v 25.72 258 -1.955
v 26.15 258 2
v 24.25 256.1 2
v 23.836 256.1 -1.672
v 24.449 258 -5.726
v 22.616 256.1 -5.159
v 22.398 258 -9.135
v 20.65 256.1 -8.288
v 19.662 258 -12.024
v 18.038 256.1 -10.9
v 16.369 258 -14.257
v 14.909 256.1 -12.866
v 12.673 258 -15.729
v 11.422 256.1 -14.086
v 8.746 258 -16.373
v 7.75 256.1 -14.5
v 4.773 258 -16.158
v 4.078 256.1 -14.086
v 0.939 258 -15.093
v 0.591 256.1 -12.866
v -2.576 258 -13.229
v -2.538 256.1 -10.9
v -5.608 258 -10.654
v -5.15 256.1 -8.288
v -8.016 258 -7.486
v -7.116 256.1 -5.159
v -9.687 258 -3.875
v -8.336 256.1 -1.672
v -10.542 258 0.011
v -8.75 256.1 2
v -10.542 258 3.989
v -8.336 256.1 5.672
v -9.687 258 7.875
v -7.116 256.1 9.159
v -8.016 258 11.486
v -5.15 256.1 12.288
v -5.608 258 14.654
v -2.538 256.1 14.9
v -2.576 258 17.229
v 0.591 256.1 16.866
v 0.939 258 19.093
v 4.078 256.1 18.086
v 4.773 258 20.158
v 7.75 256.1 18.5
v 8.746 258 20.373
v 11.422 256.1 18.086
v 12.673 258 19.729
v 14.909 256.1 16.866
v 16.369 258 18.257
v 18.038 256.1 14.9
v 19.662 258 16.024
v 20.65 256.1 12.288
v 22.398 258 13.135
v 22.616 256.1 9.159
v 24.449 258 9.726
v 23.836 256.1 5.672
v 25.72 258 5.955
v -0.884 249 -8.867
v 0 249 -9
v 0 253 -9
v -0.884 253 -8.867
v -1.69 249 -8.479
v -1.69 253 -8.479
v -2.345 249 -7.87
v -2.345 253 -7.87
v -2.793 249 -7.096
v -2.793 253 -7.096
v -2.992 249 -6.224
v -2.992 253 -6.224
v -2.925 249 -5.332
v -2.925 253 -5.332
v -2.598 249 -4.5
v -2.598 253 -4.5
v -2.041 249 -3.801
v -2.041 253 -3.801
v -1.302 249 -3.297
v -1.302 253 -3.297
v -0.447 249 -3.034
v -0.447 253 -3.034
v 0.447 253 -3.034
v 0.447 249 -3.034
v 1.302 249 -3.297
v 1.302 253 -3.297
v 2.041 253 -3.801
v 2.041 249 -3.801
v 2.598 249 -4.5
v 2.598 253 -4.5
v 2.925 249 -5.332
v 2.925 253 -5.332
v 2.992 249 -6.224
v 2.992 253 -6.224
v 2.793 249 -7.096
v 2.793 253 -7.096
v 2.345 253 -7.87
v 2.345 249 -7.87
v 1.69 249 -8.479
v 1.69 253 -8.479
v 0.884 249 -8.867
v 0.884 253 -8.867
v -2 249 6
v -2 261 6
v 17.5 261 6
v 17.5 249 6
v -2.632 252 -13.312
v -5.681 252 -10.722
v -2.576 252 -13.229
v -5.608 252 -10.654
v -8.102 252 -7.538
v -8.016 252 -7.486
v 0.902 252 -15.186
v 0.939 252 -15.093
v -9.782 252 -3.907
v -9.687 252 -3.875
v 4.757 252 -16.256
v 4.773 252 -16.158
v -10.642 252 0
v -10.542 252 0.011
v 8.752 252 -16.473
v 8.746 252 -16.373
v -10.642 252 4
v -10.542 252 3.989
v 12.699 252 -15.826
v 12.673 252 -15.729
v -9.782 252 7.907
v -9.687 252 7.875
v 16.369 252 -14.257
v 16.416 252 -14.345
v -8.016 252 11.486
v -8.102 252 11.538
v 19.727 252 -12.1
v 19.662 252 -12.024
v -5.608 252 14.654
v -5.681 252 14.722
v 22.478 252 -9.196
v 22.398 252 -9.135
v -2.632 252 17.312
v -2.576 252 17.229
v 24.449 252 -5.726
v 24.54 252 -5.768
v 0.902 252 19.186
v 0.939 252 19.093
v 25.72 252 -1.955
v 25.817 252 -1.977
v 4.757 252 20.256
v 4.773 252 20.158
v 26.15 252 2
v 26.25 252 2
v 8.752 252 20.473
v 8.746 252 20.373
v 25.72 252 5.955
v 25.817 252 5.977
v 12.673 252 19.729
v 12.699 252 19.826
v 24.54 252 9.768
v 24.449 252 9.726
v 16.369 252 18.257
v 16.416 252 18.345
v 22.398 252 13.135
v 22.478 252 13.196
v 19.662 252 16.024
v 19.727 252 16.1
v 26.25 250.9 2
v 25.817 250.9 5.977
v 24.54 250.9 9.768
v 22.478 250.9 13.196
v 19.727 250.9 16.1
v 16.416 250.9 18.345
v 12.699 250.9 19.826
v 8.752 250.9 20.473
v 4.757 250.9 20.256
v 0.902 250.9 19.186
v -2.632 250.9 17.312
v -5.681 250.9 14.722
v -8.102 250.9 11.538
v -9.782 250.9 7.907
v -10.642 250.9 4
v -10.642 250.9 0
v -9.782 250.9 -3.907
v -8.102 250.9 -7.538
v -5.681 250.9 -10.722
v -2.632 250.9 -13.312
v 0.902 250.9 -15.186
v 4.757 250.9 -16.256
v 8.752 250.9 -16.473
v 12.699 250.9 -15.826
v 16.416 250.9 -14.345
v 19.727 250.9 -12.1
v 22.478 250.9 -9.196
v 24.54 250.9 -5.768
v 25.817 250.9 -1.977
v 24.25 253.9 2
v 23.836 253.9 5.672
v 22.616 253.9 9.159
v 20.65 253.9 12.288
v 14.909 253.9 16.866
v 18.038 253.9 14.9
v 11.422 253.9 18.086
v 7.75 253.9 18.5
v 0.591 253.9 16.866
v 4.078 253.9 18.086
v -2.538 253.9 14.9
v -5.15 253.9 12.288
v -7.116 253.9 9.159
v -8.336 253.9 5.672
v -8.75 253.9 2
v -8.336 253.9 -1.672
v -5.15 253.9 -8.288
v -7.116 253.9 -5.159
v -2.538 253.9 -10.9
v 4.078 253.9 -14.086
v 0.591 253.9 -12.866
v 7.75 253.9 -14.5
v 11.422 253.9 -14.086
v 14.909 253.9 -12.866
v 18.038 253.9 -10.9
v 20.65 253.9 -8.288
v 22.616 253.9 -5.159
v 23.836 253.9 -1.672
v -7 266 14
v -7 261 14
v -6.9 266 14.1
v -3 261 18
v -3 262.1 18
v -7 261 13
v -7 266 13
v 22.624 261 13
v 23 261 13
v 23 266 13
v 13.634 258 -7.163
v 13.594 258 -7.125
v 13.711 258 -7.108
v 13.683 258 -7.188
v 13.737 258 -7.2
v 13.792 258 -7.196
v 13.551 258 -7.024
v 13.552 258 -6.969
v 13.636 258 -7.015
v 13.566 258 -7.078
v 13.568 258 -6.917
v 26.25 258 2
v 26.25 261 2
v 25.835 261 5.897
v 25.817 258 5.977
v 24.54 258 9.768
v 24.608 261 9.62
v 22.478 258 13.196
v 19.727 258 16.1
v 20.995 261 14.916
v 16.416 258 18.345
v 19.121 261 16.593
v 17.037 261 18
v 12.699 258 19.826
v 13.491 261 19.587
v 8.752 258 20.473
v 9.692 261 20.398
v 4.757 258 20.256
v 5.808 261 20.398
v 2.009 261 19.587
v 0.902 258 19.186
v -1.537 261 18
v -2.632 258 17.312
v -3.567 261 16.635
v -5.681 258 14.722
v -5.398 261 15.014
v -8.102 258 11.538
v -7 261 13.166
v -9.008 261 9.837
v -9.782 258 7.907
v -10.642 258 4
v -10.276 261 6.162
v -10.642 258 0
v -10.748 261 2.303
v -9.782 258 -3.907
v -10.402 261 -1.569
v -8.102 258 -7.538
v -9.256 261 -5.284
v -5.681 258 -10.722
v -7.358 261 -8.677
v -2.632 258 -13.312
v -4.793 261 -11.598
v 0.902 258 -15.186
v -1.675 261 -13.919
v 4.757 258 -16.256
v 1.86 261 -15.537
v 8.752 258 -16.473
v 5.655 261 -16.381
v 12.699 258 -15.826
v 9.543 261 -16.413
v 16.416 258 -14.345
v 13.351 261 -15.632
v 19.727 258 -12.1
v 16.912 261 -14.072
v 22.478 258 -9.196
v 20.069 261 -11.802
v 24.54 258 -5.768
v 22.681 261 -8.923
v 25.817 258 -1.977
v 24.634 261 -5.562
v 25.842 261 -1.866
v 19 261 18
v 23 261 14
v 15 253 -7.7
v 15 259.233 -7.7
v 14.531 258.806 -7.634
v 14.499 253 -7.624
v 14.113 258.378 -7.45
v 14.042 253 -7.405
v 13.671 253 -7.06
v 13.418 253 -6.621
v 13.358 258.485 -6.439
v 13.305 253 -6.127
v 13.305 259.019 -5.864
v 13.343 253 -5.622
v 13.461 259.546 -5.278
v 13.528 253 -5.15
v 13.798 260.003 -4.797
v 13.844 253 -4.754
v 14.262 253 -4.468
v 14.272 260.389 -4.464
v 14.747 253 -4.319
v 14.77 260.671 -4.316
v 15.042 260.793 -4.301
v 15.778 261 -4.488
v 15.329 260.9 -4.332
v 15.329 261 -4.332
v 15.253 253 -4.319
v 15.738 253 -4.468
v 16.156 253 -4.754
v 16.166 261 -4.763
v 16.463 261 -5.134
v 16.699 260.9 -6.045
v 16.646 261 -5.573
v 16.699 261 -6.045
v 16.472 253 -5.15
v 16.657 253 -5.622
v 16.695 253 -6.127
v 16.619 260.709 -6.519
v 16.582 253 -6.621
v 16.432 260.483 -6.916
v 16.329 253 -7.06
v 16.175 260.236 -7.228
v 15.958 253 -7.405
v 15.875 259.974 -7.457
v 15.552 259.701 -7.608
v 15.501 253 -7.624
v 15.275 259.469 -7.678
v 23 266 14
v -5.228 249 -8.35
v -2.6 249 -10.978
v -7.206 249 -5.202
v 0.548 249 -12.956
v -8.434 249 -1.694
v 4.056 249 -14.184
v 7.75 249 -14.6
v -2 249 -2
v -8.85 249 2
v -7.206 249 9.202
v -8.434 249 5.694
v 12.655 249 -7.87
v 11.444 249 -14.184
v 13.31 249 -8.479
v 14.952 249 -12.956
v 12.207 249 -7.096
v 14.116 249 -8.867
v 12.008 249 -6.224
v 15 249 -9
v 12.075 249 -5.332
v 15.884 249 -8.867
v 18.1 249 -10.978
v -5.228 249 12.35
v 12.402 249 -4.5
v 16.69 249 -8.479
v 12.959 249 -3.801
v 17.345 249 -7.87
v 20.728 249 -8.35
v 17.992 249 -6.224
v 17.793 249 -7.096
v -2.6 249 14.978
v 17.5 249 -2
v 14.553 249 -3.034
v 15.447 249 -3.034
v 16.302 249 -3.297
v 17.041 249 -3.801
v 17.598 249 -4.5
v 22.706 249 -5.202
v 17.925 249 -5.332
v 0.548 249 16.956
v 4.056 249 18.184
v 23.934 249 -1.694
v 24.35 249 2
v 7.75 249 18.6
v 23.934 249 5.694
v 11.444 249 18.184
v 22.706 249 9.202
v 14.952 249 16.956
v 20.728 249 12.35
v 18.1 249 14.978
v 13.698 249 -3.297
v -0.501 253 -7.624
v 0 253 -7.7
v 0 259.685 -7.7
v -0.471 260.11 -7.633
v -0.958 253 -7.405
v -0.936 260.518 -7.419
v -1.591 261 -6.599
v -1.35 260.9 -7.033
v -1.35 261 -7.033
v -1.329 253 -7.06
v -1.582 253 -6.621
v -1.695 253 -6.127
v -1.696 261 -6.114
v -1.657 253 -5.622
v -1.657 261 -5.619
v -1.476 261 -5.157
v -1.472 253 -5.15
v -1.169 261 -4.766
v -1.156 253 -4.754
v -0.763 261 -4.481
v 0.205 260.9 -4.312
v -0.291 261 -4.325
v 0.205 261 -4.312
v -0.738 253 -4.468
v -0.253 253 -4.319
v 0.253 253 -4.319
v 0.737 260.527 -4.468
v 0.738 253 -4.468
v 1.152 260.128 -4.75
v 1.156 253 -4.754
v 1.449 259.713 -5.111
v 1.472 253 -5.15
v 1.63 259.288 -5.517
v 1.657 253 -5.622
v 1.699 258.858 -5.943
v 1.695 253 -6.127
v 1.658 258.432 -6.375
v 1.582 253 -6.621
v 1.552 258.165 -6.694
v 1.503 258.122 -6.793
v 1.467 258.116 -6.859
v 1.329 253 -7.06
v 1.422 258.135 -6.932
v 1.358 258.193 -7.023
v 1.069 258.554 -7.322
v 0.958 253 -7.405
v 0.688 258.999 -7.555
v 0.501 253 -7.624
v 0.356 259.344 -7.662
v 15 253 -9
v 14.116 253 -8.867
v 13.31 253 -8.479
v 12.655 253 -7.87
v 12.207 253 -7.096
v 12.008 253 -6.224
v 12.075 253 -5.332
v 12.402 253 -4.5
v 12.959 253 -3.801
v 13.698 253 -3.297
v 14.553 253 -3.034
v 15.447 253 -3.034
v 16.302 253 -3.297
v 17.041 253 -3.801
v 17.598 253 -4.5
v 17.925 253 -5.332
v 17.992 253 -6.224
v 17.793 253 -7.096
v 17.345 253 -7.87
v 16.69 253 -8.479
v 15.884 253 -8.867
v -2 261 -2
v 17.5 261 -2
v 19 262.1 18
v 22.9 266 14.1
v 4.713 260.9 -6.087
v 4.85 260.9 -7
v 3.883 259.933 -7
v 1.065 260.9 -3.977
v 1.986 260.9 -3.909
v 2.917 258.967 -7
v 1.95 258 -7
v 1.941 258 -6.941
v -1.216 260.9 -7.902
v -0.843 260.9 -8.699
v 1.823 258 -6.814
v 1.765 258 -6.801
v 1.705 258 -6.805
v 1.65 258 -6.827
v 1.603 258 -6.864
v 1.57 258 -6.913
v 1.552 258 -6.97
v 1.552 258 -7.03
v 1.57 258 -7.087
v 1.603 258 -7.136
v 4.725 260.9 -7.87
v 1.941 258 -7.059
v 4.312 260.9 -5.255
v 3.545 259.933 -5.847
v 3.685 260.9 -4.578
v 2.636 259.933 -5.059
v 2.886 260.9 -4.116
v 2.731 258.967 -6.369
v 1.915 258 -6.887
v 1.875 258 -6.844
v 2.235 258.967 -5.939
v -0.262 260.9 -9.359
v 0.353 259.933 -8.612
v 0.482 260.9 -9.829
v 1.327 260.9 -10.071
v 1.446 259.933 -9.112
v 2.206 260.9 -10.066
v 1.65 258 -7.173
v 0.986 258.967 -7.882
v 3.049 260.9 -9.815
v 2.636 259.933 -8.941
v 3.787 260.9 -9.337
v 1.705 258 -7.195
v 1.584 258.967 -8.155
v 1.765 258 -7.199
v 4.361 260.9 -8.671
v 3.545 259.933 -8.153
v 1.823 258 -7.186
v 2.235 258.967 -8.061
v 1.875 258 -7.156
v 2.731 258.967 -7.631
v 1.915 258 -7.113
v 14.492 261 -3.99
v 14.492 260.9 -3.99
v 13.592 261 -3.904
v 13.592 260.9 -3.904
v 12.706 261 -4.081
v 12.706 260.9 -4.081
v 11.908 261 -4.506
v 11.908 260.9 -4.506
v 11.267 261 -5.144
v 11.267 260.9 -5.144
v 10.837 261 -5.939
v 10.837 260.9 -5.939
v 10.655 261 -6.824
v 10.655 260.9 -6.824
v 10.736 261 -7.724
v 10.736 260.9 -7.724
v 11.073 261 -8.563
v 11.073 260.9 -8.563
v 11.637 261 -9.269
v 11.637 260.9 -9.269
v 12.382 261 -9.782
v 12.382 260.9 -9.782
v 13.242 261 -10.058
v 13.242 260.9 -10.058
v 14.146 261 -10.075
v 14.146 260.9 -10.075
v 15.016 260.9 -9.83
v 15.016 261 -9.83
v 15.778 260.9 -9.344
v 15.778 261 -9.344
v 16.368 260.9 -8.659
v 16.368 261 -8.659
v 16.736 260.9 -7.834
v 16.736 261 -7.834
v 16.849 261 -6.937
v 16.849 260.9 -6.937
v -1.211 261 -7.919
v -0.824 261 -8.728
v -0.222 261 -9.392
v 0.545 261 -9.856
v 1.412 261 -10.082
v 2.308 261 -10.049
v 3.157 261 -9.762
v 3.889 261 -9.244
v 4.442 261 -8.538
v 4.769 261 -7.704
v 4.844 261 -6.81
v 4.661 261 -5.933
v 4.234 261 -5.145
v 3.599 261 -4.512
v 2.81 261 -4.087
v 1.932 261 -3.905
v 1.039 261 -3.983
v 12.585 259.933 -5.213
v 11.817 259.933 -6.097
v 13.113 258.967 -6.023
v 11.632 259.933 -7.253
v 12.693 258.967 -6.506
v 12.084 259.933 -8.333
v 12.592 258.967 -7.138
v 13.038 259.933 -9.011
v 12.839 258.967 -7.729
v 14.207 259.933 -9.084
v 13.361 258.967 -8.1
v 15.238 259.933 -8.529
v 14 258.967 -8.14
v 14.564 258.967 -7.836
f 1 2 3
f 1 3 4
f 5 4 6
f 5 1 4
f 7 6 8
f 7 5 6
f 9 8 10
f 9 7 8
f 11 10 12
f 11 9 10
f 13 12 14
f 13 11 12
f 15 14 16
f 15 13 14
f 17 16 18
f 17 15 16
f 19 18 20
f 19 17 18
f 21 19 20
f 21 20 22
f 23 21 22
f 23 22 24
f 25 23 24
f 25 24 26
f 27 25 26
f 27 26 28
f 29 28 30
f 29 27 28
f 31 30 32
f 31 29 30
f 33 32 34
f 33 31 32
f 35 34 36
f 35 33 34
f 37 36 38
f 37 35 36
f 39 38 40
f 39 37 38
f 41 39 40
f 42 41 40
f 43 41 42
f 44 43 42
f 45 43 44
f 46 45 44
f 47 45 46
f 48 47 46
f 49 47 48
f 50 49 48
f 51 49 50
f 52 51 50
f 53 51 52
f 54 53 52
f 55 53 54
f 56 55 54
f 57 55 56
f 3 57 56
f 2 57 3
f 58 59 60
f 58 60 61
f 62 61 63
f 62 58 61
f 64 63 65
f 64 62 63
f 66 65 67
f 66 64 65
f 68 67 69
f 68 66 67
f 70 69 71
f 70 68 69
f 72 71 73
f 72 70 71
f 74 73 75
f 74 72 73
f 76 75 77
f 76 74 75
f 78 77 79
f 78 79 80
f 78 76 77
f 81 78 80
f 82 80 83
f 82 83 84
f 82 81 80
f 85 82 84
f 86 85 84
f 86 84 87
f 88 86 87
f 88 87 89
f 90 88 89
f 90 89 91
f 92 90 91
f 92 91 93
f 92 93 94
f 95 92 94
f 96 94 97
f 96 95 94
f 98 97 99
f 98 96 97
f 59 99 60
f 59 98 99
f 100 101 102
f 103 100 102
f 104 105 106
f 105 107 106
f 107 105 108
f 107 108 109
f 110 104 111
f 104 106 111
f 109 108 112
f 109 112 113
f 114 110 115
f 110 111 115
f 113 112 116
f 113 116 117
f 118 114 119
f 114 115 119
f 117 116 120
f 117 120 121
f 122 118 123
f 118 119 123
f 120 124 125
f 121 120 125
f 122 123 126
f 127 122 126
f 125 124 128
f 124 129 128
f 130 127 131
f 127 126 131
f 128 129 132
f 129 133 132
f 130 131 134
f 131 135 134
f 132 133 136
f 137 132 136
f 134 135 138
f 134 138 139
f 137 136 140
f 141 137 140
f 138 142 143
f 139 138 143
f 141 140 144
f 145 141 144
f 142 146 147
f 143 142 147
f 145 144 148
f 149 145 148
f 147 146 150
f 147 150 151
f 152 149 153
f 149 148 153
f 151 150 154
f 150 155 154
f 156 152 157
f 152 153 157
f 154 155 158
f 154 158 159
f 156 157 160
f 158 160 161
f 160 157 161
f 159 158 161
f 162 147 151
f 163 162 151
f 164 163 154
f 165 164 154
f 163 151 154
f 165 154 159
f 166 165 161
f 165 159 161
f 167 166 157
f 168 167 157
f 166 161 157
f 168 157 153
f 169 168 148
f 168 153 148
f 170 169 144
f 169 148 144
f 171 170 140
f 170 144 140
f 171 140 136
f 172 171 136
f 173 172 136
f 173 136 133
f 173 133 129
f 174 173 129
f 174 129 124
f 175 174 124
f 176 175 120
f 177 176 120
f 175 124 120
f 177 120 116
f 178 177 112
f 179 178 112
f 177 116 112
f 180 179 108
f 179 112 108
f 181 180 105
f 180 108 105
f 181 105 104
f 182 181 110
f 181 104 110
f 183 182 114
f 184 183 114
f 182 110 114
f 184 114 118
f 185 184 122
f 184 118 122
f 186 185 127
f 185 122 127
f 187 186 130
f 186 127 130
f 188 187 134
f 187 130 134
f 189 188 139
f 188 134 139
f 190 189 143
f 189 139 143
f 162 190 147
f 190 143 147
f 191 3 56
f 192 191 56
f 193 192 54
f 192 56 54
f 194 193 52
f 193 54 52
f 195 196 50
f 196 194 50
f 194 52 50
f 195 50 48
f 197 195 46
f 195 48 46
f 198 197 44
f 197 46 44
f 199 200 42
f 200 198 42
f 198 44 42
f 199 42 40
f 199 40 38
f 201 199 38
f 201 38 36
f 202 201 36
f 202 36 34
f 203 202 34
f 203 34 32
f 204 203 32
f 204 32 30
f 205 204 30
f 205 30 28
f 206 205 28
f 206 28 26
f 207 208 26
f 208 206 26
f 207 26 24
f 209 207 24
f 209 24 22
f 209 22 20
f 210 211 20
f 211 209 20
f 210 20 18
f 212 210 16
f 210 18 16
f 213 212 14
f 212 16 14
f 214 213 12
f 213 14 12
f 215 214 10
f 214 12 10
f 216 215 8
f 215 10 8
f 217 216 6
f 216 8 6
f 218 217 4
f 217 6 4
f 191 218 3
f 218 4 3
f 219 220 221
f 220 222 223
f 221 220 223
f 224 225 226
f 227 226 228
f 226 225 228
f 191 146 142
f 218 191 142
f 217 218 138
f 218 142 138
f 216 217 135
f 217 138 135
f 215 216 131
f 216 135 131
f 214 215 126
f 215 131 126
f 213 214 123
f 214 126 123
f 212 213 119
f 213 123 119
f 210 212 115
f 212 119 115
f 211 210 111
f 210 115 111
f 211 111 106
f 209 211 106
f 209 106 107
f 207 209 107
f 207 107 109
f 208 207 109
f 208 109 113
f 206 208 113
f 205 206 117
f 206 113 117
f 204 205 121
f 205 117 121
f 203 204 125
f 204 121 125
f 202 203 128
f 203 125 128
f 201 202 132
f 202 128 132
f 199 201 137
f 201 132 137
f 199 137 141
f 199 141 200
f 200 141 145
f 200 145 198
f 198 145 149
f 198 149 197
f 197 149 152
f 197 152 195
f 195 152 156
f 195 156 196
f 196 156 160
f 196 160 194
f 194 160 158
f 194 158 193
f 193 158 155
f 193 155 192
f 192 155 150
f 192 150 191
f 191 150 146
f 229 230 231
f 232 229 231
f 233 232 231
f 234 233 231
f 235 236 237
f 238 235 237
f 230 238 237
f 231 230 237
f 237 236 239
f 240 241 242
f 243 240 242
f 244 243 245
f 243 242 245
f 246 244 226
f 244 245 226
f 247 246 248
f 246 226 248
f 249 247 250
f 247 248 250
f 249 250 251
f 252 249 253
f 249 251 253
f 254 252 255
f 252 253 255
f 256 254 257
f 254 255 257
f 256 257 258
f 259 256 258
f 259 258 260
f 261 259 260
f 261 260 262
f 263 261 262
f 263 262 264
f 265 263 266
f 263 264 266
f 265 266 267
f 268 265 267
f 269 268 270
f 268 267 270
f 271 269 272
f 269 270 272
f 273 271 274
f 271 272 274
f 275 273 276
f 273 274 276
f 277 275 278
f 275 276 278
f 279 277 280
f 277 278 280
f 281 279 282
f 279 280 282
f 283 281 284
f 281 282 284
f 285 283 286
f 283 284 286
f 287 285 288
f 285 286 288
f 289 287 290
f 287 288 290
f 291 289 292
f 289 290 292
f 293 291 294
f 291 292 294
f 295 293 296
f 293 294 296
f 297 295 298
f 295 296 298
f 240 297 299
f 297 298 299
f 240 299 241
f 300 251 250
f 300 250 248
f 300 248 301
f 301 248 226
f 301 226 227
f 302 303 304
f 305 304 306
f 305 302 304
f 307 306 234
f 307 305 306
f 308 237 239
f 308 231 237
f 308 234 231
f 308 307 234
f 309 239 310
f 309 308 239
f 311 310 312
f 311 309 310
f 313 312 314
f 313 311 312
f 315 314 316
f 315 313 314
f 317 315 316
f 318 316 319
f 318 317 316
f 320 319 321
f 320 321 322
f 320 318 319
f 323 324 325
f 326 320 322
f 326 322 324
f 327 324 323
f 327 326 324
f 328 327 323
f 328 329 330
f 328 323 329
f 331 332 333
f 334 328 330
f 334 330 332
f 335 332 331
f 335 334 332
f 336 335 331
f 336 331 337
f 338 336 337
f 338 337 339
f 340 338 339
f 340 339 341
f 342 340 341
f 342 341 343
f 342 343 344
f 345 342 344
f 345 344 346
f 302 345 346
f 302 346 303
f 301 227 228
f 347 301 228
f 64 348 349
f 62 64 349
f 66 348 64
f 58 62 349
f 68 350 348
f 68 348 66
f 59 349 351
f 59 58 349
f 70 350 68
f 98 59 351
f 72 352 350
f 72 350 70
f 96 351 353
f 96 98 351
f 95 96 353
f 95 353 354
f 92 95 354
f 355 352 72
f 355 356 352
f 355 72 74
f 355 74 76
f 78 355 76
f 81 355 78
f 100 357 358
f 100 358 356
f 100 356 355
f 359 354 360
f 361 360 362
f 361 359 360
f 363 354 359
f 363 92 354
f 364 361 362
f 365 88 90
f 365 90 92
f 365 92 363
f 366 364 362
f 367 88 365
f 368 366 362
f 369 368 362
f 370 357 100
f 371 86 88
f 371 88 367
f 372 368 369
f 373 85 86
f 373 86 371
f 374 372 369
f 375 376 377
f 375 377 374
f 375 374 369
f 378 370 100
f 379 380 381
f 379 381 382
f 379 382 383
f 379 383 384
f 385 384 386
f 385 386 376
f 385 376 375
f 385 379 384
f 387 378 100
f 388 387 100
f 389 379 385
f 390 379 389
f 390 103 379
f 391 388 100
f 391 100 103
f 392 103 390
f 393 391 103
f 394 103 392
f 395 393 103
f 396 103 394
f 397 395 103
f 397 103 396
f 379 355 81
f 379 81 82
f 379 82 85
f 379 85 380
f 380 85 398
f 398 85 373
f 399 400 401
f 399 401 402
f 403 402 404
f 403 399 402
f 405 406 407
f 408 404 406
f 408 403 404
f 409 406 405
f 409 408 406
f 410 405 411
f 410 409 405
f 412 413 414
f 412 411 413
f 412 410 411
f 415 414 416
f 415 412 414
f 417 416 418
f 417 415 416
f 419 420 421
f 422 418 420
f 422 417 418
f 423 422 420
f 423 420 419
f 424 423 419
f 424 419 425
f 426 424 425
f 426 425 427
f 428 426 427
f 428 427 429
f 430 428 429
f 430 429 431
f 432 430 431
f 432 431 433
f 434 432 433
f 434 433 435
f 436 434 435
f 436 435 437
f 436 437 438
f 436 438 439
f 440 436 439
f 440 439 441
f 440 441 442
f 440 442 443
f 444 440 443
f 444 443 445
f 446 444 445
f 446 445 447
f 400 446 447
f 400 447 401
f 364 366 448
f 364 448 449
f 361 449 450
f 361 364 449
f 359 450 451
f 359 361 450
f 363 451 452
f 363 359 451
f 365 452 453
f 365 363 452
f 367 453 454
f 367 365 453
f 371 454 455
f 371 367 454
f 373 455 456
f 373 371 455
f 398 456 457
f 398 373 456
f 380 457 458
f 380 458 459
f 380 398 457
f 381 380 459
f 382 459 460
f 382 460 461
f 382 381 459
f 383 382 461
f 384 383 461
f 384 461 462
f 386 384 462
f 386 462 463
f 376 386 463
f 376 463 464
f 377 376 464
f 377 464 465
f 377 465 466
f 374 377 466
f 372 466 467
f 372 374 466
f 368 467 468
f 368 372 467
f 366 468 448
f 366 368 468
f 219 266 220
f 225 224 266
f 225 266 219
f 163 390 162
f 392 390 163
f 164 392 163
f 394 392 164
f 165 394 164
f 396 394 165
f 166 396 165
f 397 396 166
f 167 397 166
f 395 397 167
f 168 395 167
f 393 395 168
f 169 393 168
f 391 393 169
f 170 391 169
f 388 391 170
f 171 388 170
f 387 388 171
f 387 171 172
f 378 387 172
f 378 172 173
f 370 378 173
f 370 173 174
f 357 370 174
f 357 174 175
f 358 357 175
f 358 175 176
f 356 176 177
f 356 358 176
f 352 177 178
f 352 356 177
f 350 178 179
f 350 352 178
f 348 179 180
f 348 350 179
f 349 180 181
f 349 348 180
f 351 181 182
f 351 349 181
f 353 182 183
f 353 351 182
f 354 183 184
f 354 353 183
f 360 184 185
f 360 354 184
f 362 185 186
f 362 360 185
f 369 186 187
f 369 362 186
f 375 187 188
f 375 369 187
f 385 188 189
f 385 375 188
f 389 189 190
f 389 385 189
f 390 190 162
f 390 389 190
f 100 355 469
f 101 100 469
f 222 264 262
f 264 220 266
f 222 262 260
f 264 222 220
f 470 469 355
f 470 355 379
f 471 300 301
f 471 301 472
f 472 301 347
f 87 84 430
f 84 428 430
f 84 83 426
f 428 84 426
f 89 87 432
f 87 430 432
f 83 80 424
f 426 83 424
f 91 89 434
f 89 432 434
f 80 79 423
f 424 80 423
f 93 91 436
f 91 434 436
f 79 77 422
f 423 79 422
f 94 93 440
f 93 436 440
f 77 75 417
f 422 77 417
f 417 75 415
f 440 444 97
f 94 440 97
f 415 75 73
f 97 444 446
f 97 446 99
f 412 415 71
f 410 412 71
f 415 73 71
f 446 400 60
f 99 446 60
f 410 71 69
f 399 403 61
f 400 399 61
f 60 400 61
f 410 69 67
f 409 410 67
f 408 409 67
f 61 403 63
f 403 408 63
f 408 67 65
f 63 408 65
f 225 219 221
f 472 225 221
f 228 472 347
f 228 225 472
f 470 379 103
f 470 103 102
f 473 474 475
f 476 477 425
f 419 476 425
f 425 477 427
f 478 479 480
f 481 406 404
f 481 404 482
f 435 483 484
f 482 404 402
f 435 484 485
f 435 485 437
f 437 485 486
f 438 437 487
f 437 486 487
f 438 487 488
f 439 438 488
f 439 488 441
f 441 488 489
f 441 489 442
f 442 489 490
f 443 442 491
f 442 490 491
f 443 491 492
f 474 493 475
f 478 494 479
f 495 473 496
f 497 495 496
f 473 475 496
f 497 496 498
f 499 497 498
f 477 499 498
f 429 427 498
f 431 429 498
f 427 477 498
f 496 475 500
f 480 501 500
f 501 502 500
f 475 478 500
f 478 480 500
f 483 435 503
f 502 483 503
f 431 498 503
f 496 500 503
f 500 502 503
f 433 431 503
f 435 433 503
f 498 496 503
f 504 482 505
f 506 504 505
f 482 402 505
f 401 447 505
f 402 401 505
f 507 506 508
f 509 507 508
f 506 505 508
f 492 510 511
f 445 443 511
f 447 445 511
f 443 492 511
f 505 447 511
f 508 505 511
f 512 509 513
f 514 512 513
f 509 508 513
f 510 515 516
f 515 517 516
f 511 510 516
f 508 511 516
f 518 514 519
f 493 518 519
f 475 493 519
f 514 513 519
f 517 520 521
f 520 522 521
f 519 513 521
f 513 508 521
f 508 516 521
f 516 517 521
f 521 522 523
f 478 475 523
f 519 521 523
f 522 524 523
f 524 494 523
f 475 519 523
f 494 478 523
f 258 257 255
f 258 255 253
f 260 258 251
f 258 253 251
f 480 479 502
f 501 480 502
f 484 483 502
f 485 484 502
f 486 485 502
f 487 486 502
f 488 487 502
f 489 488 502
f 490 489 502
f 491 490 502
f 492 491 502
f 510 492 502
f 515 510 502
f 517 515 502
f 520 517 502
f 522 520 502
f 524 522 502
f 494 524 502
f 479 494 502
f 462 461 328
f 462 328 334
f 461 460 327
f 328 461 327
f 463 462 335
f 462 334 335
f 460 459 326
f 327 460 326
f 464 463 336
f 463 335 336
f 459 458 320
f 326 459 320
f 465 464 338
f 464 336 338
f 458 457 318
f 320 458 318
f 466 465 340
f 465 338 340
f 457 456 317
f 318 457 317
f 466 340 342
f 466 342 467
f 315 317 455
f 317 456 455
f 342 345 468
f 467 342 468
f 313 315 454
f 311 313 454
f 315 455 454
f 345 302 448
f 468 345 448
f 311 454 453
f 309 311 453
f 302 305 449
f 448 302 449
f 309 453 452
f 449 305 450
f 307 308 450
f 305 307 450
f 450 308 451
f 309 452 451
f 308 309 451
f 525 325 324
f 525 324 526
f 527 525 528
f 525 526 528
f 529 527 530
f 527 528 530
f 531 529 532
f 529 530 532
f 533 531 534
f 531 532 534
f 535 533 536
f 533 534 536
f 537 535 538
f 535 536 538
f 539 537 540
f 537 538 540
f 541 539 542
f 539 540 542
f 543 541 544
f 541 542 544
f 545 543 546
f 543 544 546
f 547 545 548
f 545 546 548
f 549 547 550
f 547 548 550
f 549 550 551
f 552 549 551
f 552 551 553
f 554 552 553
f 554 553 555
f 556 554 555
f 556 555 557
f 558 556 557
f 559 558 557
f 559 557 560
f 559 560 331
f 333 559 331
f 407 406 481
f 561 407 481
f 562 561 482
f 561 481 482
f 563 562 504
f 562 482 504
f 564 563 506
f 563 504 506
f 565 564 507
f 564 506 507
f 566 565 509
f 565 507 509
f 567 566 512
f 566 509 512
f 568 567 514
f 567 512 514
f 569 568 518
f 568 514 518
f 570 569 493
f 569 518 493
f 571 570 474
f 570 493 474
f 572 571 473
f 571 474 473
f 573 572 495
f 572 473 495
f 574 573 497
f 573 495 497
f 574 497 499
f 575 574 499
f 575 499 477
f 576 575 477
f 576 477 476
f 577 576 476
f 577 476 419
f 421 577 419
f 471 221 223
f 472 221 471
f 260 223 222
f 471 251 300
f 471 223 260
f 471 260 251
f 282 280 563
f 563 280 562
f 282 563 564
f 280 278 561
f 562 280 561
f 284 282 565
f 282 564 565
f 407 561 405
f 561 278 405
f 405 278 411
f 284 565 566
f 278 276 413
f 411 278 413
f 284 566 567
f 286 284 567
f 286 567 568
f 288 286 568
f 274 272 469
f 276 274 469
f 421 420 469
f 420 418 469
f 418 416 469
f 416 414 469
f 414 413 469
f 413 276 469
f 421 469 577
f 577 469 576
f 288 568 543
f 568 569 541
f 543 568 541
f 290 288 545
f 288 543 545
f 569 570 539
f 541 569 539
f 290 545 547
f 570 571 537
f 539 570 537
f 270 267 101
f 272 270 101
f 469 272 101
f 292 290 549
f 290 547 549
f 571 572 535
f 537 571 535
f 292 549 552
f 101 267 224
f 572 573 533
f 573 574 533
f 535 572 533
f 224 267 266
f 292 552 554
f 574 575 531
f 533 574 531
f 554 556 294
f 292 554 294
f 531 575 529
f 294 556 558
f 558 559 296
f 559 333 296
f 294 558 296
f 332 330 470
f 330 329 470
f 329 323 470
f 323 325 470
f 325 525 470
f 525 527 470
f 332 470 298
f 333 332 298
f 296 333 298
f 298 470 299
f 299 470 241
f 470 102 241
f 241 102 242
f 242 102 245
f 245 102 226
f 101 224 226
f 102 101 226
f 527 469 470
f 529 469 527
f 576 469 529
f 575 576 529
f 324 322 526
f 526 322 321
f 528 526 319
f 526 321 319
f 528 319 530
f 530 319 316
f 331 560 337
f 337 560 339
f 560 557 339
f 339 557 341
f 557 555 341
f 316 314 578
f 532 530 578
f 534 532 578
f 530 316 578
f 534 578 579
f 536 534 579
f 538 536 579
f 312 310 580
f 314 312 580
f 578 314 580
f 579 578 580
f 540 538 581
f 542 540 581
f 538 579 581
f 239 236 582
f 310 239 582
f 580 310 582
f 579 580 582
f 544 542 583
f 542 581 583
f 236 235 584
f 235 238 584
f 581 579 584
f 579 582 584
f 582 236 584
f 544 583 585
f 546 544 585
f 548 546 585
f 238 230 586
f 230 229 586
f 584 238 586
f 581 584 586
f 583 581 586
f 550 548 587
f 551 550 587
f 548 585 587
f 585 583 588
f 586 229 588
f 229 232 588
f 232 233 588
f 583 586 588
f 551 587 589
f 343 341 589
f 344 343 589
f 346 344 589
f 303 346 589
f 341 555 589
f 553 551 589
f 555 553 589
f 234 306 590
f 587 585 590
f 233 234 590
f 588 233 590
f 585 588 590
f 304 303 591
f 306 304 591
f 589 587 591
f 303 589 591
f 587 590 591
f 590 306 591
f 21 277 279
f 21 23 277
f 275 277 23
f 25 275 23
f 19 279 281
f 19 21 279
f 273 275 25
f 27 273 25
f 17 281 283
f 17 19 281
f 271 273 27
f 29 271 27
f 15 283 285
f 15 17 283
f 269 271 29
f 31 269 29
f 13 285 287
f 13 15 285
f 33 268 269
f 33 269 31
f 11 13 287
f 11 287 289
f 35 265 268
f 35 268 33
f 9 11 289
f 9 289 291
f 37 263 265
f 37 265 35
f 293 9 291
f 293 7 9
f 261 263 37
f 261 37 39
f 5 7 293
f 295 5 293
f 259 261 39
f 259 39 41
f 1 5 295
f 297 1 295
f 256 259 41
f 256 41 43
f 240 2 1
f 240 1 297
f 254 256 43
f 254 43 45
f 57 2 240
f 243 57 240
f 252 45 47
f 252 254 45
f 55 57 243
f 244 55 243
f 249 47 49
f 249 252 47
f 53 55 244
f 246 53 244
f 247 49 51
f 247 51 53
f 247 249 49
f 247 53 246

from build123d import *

# Parameters (mm, degrees)
CYLINDER027_R             = 3
CYLINDER027_DEPTH         = 4
BOX005009016_W            = 16
BOX005009016_H            = 5.6
BOX005009016_DEPTH        = 3
CYLINDER026_R             = 1.7
CYLINDER026_DEPTH         = 30
FUSION026_PITCH_ANGLE     = 90
FUSION026_PLACEMENT_ANGLE = 90
FUSION025_PITCH_ANGLE     = 90
FUSION025_PLACEMENT_ANGLE = 90
BOX005009013_W            = 19.5
BOX005009013_H            = 400
BOX005009013_DEPTH        = 8
CYLINDER023_R             = 3.1
CYLINDER023_DEPTH         = 6
CYLINDER023_ROLL_ANGLE    = 90
CHAMFER015_SIZE           = 2.9
CHAMFER013_SIZE           = 2.9
CYLINDER021_R             = 18.5
CYLINDER021_DEPTH         = 3
CYLINDER021_ROLL_ANGLE    = 90
CYLINDER020_R             = 16.5
CYLINDER020_DEPTH         = 10
CYLINDER020_ROLL_ANGLE    = 90
CYLINDER019_R             = 18.5
CYLINDER019_DEPTH         = 3
CYLINDER019_ROLL_ANGLE    = 90
BOX005009014_W            = 30
BOX005009014_H            = 5
BOX005009014_DEPTH        = 5
CHAMFER016_SIZE           = 4
CHAMFER017_SIZE           = 4
CHAMFER018_SIZE           = 3.9
CHAMFER020_SIZE           = 1.9
CHAMFER021_SIZE           = 1.9
CHAMFER022_SIZE           = 1.9


with BuildPart() as cylinder018:
    # Cylinder027 → Cylinder027 (new body)
    with BuildSketch(Plane.XY):
        Circle(CYLINDER027_R)
    extrude(amount=CYLINDER027_DEPTH)


with BuildPart() as cube003:
    # Box005009016 → Box005009016 (new body)
    with BuildSketch(Plane(origin=(-3.2, -2.8, 18), x_dir=(1, 0, 0), z_dir=(0, 0, 1))):
        with Locations((8, 2.8)):
            Rectangle(BOX005009016_W, BOX005009016_H)
    extrude(amount=BOX005009016_DEPTH)


with BuildPart() as cylinder017:
    # Cylinder026 → Cylinder026 (new body)
    with BuildSketch(Plane.XY.offset(1)):
        Circle(CYLINDER026_R)
    extrude(amount=CYLINDER026_DEPTH)


with BuildPart() as m3_cavity003:
    # Fusion026 base: copy of Cylinder017
    add(cylinder017.part)

    # Fusion026: union Cylinder018, Cube003
    add(cylinder018.part)
    add(cube003.part)


with BuildPart() as m3_cavity003_1:
    # Fusion026 pitch: moved
    add(m3_cavity003.part.rotate(Axis((0, 0, 0), (0, 1, 0)), FUSION026_PITCH_ANGLE))


with BuildPart() as m3_cavity003_2:
    # Fusion026 placement: moved
    add(m3_cavity003_1.part.moved(Location((15, 249, -6))).rotate(Axis((15, 249, -6), (0, 0, 1)), FUSION026_PLACEMENT_ANGLE))


with BuildPart() as m3_cavity002:
    # Fusion025 base: copy of Cylinder017
    add(cylinder017.part)

    # Fusion025: union Cylinder018, Cube003
    add(cylinder018.part)
    add(cube003.part)


with BuildPart() as m3_cavity002_1:
    # Fusion025 pitch: moved
    add(m3_cavity002.part.rotate(Axis((0, 0, 0), (0, 1, 0)), FUSION025_PITCH_ANGLE))


with BuildPart() as m3_cavity002_2:
    # Fusion025 placement: moved
    add(m3_cavity002_1.part.moved(Location((0, 249, -6))).rotate(Axis((0, 249, -6), (0, 0, 1)), FUSION025_PLACEMENT_ANGLE))


with BuildPart() as scale_hole002:
    # Box005009013 → Box005009013 (new body)
    with BuildSketch(Plane(origin=(-2, 0, -2), x_dir=(1, 0, 0), z_dir=(0, 0, 1))):
        with Locations((9.75, 200)):
            Rectangle(BOX005009013_W, BOX005009013_H)
    extrude(amount=BOX005009013_DEPTH)


with BuildPart() as lug_hole:
    # Cylinder023 → Cylinder023 (new body)
    with BuildSketch(Plane.XY):
        Circle(CYLINDER023_R)
    extrude(amount=CYLINDER023_DEPTH)


with BuildPart() as lug_hole_1:
    # Cylinder023 roll: moved
    add(lug_hole.part.rotate(Axis((0, 0, 0), (1, 0, 0)), CYLINDER023_ROLL_ANGLE))


with BuildPart() as lug_hole_2:
    # Cylinder023 placement: moved
    add(lug_hole_1.part.moved(Location((7.75, 328, -7))))


with BuildPart() as chamfer015:
    # Chamfer015 base: copy of lug-hole
    add(lug_hole_2.part)

    # Chamfer015
    chamfer015_edges = [chamfer015.edges().sort_by_distance(p)[0] for p in [
        (4.65, 328, -7),
    ]]
    chamfer(chamfer015_edges, length=CHAMFER015_SIZE)


with BuildPart() as chamfer015_1:
    # Chamfer015 placement: moved
    add(chamfer015.part.moved(Location((6, 0, 0))))


with BuildPart() as part_mirroring003:
    # Part__Mirroring003: instance of Chamfer015
    add(chamfer015_1.part.mirror(Plane(origin=(0, 200, 0), x_dir=(1, 0, 0), z_dir=(0, 1, 0))))


with BuildPart() as chamfer013:
    # Chamfer013 base: copy of lug-hole
    add(lug_hole_2.part)

    # Chamfer013
    chamfer013_edges = [chamfer013.edges().sort_by_distance(p)[0] for p in [
        (4.65, 328, -7),
    ]]
    chamfer(chamfer013_edges, length=CHAMFER013_SIZE)


with BuildPart() as chamfer013_1:
    # Chamfer013 placement: moved
    add(chamfer013.part.moved(Location((-6, 0, 0))))


with BuildPart() as fusion017:
    # Part__Mirroring001: instance of Chamfer013
    add(chamfer013_1.part.mirror(Plane(origin=(0, 200, 0), x_dir=(1, 0, 0), z_dir=(0, 1, 0))))

    # Fusion017: union Part__Mirroring003
    add(part_mirroring003.part)


with BuildPart() as fusion017_1:
    # Fusion017 placement: moved
    add(fusion017.part.moved(Location((0, 186, 0))))


with BuildPart() as end_cheek002:
    # Cylinder021 → Cylinder021 (new body)
    with BuildSketch(Plane.XY):
        Circle(CYLINDER021_R)
    extrude(amount=CYLINDER021_DEPTH)


with BuildPart() as end_cheek002_1:
    # Cylinder021 roll: moved
    add(end_cheek002.part.rotate(Axis((0, 0, 0), (1, 0, 0)), CYLINDER021_ROLL_ANGLE))


with BuildPart() as end_cheek002_2:
    # Cylinder021 placement: moved
    add(end_cheek002_1.part.moved(Location((7.75, 486, 2))))


with BuildPart() as cable_tie_cyl002:
    # Cylinder020 → Cylinder020 (new body)
    with BuildSketch(Plane.XY):
        Circle(CYLINDER020_R)
    extrude(amount=CYLINDER020_DEPTH)


with BuildPart() as cable_tie_cyl002_1:
    # Cylinder020 roll: moved
    add(cable_tie_cyl002.part.rotate(Axis((0, 0, 0), (1, 0, 0)), CYLINDER020_ROLL_ANGLE))


with BuildPart() as cable_tie_cyl002_2:
    # Cylinder020 placement: moved
    add(cable_tie_cyl002_1.part.moved(Location((7.75, 485, 2))))


with BuildPart() as cut020:
    # Cylinder019 → Cylinder019 (new body)
    with BuildSketch(Plane.XY):
        Circle(CYLINDER019_R)
    extrude(amount=CYLINDER019_DEPTH)


with BuildPart() as cut020_1:
    # Cylinder019 roll: moved
    add(cut020.part.rotate(Axis((0, 0, 0), (1, 0, 0)), CYLINDER019_ROLL_ANGLE))


with BuildPart() as cut020_2:
    # Cylinder019 placement: moved
    add(cut020_1.part.moved(Location((7.75, 477, 2))))

    # Fusion012: union end-cheek002, cable-tie-cyl002
    add(end_cheek002_2.part)
    add(cable_tie_cyl002_2.part)


with BuildPart() as cut020_3:
    # Fusion012 placement: moved
    add(cut020_2.part.moved(Location((0, -225, 0))))

    # Cut017: cut Fusion017
    add(fusion017_1.part, mode=Mode.SUBTRACT)

    # Cut020: cut scale-hole002
    add(scale_hole002.part, mode=Mode.SUBTRACT)


with BuildPart() as slide_end_r:
    # Box005009014 → Box005009014 (new body)
    with BuildSketch(Plane(origin=(-7, 261, 13), x_dir=(1, 0, 0), z_dir=(0, 0, 1))):
        with Locations((15, 2.5)):
            Rectangle(BOX005009014_W, BOX005009014_H)
    extrude(amount=BOX005009014_DEPTH)

    # Chamfer016
    chamfer016_edges = [slide_end_r.edges().sort_by_distance(p)[0] for p in [
        (-7, 263.5, 18),
    ]]
    chamfer(chamfer016_edges, length=CHAMFER016_SIZE)

    # Chamfer017
    chamfer017_edges = [slide_end_r.edges().sort_by_distance(p)[0] for p in [
        (23, 263.5, 18),
    ]]
    chamfer(chamfer017_edges, length=CHAMFER017_SIZE)

    # Chamfer018
    chamfer018_edges = [slide_end_r.edges().sort_by_distance(p)[0] for p in [
        (8, 266, 18),
    ]]
    chamfer(chamfer018_edges, length=CHAMFER018_SIZE)

    # Fusion020: union Cut020
    add(cut020_3.part)

    # Chamfer020
    chamfer020_edges = [slide_end_r.edges().sort_by_distance(p)[0] for p in [
        (-8.75, 252, 2),
    ]]
    chamfer(chamfer020_edges, length=CHAMFER020_SIZE)

    # Chamfer021
    chamfer021_edges = [slide_end_r.edges().sort_by_distance(p)[0] for p in [
        (-10.75, 249, 2),
    ]]
    chamfer(chamfer021_edges, length=CHAMFER021_SIZE)

    # Chamfer022
    chamfer022_edges = [slide_end_r.edges().sort_by_distance(p)[0] for p in [
        (-8.75, 258, 2),
    ]]
    chamfer(chamfer022_edges, length=CHAMFER022_SIZE)

    # Cut025: cut M3-cavity002
    add(m3_cavity002_2.part, mode=Mode.SUBTRACT)

    # Cut026: cut M3-cavity003
    add(m3_cavity003_2.part, mode=Mode.SUBTRACT)


solid = slide_end_r.part
